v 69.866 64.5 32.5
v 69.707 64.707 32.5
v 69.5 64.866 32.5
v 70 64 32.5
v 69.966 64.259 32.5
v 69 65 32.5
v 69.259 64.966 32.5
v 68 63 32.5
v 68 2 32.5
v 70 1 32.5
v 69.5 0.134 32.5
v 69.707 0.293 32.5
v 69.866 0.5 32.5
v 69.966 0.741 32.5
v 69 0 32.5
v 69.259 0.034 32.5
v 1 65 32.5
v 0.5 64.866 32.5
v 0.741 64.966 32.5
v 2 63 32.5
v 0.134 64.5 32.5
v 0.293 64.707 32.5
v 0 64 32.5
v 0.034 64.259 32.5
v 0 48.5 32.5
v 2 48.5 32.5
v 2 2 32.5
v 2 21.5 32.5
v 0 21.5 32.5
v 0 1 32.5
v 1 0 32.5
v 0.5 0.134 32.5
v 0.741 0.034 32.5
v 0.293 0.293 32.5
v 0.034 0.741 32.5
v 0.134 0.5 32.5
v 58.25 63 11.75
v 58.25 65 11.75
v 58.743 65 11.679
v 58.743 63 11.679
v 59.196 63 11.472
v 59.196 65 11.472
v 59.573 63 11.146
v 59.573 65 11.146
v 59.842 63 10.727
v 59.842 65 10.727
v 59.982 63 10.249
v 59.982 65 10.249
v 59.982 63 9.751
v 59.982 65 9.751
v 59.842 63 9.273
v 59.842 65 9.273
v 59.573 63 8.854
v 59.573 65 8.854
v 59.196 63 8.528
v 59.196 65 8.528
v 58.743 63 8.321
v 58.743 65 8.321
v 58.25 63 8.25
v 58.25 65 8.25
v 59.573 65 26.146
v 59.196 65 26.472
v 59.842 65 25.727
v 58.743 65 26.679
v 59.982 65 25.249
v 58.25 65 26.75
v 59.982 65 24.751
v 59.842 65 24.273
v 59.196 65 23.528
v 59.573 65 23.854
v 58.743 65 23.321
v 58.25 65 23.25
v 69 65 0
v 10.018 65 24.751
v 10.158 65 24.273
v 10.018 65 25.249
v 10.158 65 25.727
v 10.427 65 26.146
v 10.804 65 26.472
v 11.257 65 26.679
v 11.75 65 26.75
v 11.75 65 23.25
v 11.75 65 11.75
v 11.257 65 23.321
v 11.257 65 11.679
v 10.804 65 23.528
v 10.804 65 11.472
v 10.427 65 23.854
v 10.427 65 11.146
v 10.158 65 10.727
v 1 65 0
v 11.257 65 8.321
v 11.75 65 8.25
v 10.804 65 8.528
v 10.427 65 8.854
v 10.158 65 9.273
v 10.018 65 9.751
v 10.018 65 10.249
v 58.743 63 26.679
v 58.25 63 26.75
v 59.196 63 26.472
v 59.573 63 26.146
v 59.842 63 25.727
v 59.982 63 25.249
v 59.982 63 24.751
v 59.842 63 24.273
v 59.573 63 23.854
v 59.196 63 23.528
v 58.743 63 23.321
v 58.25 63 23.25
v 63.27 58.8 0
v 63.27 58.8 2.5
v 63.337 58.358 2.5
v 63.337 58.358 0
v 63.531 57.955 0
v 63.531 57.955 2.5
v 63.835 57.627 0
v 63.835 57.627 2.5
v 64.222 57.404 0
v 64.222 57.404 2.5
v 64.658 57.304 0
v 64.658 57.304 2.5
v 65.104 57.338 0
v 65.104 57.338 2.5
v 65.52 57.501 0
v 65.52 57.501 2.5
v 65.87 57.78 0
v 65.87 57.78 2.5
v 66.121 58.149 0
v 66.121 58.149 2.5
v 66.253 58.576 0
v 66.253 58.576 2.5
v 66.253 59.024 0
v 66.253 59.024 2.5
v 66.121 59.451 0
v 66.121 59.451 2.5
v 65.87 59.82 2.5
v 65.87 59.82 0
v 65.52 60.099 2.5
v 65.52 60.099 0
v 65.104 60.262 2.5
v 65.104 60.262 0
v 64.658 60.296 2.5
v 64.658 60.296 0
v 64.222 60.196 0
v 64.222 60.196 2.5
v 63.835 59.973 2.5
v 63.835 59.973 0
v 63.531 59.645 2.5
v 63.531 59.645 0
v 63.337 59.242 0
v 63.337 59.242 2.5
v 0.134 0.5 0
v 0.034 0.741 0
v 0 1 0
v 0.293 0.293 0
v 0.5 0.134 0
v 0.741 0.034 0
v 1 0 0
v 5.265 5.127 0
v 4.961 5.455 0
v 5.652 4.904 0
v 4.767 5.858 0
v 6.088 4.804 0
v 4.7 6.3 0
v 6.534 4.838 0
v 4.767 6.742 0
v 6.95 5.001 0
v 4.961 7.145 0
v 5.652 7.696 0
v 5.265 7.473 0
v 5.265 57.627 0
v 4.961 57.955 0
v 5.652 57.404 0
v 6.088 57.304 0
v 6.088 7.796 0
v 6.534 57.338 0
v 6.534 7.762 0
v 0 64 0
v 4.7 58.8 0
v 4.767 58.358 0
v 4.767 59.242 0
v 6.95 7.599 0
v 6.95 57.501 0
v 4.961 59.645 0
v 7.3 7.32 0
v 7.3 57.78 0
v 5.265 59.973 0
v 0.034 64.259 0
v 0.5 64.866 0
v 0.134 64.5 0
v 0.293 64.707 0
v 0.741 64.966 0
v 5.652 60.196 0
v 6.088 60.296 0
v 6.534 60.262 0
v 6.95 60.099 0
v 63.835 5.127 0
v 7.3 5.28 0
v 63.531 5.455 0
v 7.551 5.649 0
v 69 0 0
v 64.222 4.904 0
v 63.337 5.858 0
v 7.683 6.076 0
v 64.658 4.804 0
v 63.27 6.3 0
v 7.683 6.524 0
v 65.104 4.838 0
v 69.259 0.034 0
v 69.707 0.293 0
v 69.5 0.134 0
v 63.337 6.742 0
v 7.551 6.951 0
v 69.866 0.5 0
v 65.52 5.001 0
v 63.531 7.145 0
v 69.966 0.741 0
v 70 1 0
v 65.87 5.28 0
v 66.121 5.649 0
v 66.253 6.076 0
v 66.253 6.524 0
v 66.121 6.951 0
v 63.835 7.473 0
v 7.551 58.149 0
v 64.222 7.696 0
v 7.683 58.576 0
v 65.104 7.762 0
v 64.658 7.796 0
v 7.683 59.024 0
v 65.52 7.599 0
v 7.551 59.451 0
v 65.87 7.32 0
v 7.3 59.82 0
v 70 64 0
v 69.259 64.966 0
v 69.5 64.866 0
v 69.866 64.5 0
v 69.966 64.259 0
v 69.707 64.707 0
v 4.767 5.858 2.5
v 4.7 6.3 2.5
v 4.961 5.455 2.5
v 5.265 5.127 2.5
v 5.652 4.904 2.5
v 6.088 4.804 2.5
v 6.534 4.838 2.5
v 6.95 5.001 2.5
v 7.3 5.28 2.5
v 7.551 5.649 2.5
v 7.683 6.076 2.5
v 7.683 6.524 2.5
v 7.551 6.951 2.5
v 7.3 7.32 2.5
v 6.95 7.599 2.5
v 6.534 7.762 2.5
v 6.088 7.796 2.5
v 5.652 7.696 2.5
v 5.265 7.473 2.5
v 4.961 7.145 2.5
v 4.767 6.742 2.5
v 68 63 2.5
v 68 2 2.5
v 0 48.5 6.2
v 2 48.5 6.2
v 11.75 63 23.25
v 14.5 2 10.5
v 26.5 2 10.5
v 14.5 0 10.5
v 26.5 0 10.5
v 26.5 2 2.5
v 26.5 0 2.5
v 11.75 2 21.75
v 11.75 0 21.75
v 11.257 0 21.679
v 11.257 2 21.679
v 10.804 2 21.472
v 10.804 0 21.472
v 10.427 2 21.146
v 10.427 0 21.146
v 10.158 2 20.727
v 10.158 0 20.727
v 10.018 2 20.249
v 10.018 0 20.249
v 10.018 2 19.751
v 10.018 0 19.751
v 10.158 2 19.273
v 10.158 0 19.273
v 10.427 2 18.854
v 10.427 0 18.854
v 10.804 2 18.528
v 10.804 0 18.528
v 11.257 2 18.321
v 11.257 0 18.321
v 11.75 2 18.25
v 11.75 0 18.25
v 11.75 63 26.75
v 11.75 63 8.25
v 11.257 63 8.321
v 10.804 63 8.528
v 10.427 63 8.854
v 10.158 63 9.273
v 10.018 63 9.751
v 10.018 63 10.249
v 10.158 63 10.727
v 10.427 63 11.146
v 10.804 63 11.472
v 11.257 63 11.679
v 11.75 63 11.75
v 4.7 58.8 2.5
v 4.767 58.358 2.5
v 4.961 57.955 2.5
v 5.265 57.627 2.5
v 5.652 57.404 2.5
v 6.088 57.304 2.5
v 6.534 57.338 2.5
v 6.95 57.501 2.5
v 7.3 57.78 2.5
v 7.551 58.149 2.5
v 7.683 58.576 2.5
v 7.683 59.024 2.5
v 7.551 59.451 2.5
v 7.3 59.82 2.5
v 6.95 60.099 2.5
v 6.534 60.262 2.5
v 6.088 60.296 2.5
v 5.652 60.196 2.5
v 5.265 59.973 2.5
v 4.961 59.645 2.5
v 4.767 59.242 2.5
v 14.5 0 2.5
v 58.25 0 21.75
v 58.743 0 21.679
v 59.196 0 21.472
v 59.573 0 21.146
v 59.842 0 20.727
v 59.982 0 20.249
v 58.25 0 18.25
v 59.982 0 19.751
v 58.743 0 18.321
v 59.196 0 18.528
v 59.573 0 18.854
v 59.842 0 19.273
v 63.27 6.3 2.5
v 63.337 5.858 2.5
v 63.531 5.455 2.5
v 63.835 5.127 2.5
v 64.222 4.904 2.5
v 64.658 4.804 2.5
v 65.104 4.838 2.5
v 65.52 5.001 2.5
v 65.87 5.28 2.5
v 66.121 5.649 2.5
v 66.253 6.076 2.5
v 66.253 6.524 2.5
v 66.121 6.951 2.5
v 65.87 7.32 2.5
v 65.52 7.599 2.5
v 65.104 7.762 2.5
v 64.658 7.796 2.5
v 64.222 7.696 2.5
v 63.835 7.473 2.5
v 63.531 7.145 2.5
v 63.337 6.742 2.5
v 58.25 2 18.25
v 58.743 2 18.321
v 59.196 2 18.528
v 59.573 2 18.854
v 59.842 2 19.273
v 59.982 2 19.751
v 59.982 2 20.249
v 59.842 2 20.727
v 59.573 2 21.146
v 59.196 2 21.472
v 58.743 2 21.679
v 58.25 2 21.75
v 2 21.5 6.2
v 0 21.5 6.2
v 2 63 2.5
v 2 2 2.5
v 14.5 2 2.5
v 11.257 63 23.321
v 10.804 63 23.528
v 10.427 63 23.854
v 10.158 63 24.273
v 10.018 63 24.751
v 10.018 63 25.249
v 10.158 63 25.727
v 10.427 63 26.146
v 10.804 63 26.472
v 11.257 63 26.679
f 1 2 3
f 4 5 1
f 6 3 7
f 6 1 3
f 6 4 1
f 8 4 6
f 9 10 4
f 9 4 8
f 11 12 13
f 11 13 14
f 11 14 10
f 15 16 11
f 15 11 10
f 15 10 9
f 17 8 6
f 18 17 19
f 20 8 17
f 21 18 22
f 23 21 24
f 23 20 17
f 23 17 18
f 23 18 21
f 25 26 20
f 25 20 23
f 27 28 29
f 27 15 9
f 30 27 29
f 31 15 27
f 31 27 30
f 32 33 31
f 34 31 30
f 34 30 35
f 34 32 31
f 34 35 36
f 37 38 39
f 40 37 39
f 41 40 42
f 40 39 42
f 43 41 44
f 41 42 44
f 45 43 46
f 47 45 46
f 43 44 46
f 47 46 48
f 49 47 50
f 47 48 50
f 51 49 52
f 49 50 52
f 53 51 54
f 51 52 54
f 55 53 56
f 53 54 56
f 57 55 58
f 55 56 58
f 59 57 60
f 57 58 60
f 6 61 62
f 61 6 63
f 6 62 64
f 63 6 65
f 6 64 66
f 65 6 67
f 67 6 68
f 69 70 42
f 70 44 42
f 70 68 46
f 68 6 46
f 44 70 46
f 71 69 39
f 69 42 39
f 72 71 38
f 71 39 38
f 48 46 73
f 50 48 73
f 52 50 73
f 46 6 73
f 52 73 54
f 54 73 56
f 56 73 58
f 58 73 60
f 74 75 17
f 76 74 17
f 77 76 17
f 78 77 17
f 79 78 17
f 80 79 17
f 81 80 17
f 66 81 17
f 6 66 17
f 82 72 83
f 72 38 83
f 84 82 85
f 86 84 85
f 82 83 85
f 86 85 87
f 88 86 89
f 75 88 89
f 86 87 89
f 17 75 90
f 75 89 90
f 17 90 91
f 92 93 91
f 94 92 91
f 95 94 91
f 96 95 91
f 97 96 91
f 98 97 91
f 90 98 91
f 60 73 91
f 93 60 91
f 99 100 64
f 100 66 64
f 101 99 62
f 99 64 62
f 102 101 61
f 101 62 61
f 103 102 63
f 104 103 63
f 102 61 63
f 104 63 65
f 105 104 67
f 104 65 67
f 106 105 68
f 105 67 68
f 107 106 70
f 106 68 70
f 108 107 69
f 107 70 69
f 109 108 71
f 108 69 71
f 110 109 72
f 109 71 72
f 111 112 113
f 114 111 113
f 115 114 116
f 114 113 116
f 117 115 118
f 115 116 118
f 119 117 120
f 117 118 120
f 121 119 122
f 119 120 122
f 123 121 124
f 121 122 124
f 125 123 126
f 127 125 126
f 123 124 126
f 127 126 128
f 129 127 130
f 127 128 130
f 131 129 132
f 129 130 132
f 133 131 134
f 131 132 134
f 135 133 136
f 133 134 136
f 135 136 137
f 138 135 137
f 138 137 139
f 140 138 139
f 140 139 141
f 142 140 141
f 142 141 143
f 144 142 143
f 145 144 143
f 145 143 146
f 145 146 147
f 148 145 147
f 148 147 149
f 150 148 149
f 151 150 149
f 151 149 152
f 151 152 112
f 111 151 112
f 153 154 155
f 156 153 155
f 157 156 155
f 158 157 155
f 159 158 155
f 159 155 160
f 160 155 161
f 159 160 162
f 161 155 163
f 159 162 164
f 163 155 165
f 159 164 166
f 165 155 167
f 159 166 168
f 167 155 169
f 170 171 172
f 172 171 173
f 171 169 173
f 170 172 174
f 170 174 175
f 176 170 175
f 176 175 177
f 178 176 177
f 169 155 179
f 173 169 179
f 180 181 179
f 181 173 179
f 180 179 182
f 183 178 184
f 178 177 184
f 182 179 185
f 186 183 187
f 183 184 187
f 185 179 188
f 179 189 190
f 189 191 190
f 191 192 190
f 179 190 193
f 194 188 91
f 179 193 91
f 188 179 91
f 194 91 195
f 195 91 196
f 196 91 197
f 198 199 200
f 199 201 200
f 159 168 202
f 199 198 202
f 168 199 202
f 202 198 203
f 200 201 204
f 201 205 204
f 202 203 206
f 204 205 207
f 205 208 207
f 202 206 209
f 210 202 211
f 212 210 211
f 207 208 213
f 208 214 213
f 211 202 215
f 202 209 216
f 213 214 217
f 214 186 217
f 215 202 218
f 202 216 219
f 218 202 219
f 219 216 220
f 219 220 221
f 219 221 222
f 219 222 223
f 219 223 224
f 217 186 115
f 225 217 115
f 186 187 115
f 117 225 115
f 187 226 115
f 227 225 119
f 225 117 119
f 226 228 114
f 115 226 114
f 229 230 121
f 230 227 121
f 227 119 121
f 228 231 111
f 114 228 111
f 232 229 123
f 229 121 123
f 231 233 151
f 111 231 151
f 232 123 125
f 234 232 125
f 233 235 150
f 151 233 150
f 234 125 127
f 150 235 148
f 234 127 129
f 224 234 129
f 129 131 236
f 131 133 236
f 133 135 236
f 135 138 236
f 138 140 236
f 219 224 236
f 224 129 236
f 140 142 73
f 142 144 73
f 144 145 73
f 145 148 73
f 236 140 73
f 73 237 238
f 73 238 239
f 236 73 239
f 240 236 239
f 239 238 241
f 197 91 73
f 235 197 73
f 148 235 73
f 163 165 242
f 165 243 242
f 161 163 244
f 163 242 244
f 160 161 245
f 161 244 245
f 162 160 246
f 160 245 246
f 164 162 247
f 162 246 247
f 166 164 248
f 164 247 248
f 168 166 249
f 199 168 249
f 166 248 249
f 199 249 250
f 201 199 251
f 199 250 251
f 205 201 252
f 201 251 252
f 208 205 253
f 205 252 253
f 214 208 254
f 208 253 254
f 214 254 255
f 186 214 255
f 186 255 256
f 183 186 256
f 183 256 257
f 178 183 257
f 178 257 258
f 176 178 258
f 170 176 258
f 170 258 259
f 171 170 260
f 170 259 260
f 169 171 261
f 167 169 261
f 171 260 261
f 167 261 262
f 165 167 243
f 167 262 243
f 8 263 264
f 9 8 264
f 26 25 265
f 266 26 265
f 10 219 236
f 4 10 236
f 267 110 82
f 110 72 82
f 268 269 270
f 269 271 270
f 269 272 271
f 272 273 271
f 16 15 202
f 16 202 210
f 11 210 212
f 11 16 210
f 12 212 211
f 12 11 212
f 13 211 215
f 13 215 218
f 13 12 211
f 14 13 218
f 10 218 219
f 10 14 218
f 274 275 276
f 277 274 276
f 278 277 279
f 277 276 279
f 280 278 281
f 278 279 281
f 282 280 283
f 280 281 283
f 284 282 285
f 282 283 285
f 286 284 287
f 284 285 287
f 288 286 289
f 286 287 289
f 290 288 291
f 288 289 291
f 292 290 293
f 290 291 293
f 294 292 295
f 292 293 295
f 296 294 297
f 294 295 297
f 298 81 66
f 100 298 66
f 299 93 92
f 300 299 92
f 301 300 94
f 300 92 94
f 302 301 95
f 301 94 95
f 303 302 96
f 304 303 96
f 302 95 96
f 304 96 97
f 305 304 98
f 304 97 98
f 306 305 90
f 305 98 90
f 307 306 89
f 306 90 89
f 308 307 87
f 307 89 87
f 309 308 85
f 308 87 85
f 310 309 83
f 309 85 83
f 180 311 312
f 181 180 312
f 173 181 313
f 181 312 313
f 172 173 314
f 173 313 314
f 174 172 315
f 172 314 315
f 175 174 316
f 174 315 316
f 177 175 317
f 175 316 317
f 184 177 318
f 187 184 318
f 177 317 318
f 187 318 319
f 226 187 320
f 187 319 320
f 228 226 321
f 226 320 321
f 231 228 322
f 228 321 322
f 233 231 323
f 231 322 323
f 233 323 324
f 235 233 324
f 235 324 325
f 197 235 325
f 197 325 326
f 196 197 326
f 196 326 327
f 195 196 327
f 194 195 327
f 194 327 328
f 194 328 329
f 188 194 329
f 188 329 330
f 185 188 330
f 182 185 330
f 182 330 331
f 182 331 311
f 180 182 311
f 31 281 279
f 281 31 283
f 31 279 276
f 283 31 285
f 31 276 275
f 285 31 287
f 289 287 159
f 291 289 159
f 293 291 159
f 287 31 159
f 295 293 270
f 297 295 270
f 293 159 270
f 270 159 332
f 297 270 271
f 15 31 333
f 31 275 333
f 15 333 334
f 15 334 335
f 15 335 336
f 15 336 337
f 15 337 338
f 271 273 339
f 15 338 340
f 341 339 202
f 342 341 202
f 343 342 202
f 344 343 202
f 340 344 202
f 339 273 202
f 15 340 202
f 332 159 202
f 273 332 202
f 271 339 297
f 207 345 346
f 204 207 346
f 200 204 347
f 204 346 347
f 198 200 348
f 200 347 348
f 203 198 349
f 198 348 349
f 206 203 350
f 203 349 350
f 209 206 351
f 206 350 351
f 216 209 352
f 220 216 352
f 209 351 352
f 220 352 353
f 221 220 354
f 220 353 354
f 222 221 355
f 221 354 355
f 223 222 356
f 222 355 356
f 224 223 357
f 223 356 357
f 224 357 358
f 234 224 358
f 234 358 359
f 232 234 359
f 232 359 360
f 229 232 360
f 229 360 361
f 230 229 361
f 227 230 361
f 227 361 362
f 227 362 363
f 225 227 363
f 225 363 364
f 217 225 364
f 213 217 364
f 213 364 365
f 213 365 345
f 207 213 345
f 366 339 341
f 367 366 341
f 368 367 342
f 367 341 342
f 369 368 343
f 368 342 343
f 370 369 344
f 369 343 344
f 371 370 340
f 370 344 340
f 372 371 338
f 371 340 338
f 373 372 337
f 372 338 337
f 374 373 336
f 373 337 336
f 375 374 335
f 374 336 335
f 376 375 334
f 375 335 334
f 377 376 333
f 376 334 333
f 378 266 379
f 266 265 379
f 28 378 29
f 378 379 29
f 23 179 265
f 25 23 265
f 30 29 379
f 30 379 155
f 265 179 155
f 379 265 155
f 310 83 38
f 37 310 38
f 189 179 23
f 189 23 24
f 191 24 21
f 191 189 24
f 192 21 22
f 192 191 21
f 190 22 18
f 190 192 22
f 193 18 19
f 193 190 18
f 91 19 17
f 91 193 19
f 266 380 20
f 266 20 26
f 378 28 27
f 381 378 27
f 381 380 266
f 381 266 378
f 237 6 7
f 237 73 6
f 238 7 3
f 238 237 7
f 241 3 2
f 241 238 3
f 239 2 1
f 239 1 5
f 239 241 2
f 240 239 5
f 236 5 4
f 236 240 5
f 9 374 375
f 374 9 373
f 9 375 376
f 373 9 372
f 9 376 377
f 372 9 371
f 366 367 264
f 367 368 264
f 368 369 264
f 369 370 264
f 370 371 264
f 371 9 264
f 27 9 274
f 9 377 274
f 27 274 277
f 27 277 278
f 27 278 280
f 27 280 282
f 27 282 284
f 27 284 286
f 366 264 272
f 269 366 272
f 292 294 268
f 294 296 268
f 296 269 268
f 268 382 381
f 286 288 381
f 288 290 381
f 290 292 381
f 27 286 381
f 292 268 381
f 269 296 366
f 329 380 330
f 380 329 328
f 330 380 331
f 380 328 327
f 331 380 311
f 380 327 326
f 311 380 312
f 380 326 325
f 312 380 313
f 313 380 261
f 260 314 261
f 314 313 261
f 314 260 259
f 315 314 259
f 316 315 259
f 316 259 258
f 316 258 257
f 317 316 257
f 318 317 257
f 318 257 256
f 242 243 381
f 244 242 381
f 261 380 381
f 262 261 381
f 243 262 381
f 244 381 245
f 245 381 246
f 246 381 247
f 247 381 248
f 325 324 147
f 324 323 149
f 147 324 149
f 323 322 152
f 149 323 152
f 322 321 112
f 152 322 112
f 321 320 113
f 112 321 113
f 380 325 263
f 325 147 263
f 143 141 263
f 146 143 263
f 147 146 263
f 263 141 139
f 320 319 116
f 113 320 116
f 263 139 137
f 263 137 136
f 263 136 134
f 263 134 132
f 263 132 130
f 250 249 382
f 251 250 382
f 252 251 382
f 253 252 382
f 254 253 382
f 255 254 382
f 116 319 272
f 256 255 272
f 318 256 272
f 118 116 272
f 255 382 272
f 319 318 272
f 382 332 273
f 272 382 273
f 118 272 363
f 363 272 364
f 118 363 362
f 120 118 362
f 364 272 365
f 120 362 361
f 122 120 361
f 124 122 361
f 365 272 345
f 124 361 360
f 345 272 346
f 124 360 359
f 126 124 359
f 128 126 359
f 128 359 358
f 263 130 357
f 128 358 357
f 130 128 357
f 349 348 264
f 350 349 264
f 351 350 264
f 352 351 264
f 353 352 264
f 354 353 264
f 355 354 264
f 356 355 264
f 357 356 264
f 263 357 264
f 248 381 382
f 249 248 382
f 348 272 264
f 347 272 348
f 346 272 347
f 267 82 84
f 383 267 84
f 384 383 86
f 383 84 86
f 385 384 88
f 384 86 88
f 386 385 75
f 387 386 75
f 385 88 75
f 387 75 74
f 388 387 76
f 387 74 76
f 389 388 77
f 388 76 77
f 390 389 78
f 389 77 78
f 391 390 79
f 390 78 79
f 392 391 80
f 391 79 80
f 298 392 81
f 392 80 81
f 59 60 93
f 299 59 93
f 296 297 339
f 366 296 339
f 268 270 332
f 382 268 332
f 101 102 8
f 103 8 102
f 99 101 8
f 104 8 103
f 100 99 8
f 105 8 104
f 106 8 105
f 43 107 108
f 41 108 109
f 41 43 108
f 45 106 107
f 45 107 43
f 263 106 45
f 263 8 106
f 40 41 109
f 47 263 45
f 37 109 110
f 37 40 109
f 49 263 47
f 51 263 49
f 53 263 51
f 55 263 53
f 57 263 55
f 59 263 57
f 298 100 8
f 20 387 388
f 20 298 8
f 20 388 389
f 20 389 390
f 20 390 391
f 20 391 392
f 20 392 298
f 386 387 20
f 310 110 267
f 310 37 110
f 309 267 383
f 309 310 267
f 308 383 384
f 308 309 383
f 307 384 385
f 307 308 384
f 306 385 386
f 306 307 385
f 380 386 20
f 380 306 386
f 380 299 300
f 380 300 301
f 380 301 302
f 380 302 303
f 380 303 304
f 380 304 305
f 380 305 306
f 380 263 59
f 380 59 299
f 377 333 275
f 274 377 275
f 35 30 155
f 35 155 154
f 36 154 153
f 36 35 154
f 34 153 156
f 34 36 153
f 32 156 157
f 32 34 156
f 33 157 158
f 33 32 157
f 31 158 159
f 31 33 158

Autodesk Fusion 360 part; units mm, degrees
sketch "Sketch1" plane through (0, 0, 0) normal (0, 0, 1) x (1, 0, 0)
  line L0 (0, 0) -> (70, 0)
  line L1 (70, 0) -> (70, 65)
  line L2 (70, 65) -> (0, 65)
  line L3 (0, 65) -> (0, 0)
  dimension "d1" = 70
  dimension "d2" = 65
extrude "Extrude1" add sketch "Sketch1" along normal blind 2.5
sketch "Sketch2" plane through (0, 0, 2.5) normal (0, 0, 1) x (-1, 0, 0)
  line L0 (0, -65) -> (0, 0)
  line L1 (0, 0) -> (-70, 0)
  line L2 (-70, 0) -> (-70, -65)
  line L3 (-70, -65) -> (0, -65)
  line L4 (0, -65) -> (-2, -65)
  line L5 (-2, -65) -> (-2, 0)
  line L6 (-2, 0) -> (0, 0)
  line L7 (0, 0) -> (0, -65)
  line L8 (-70, -65) -> (-68, -65)
  line L9 (-68, -65) -> (-68, 0)
  line L10 (-68, 0) -> (-70, 0)
  line L11 (-70, 0) -> (-70, -65)
  line L12 (0, -65) -> (-70, -65)
  line L13 (-70, -65) -> (-70, -63)
  line L14 (-70, -63) -> (0, -63)
  line L15 (0, -63) -> (0, -65)
  line L16 (0, 0) -> (-70, 0)
  line L17 (-70, 0) -> (-70, -2)
  line L18 (-70, -2) -> (0, -2)
  line L19 (0, -2) -> (0, 0)
  dimension "d5" = 2
  dimension "d6" = 2
  dimension "d7" = 65
  dimension "d8" = 2
  dimension "d9" = 2
extrude "Extrude2" add sketch "Sketch2" along normal blind 30 contours L0 L3 L4 L5 L7 L12 L14 L15 | L0 L5 L7 L14 L18 | L3 L5 L9 L12 L14 | L0 L1 L5 L6 L7 L16 L18 L19 | L2 L3 L8 L9 L11 L12 L13 L14 | L1 L5 L9 L16 L18 | L2 L9 L11 L14 L18 | L1 L2 L9 L10 L11 L16 L17 L18
sketch "Sketch3" plane through (0, 0, 2.5) normal (0, 0, 1) x (-1, 0, 0)
  line L0 (-2, -2) -> (-68, -2)
  line L1 (-68, -2) -> (-68, -63)
  line L2 (-68, -63) -> (-2, -63)
  line L3 (-2, -63) -> (-2, -2)
  circle A0 centre (-6.2, -6.3) radius 1.5
  circle A1 centre (-6.2, -58.8) radius 1.5
  circle A2 centre (-64.77, -58.8) radius 1.5
  circle A3 centre (-64.77, -6.3) radius 1.5
  dimension "d12" = 3
  dimension "d13" = 3
  dimension "d14" = 3
  dimension "d15" = 3
  dimension "d16" = 58.57
  dimension "d17" = 58.57
  dimension "d18" = 52.5
  dimension "d19" = 52.5
extrude "Extrude3" cut sketch "Sketch3" against normal blind 2.5 contours A0 | A1 | A2 | A3
sketch "Sketch6" plane through (0, 0, 0) normal (0, -1, 0) x (1, 0, 0)
  line L0 (0, 0) -> (70, 0)
  line L1 (70, 0) -> (70, 32.5)
  line L2 (70, 32.5) -> (0, 32.5)
  line L3 (0, 32.5) -> (0, 0)
  line L4 (14.5, 2.5) -> (26.5, 2.5)
  line L5 (26.5, 2.5) -> (26.5, 10.5)
  line L6 (26.5, 10.5) -> (14.5, 10.5)
  line L7 (14.5, 10.5) -> (14.5, 2.5)
  line L8 (11.75, 18.25) -> (58.25, 18.25)
  arc A0 (58.25, 18.25) -> (58.25, 21.75) centre (58.25, 20) ccw
  line L9 (58.25, 21.75) -> (11.75, 21.75)
  arc A1 (11.75, 21.75) -> (11.75, 18.25) centre (11.75, 20) ccw
  line L10 (10, 20) -> (60, 20) construction
  dimension "d32" = 12
  dimension "d33" = 8
  dimension "d34" = 2.5
  dimension "d35" = 14.5
  dimension "d36" = 3.5
sketch "Sketch7" plane through (0, 0, 0) normal (-1, 0, 0) x (0, -1, 0)
  line L0 (-65, 0) -> (0, 0)
  line L1 (0, 0) -> (0, 32.5)
  line L2 (0, 32.5) -> (-65, 32.5)
  line L3 (-65, 32.5) -> (-65, 0)
  line L4 (-48.5, 6.2) -> (-21.5, 6.2)
  line L5 (-21.5, 6.2) -> (-21.5, 32.5)
  line L6 (-21.5, 32.5) -> (-48.5, 32.5)
  line L7 (-48.5, 32.5) -> (-48.5, 6.2)
  dimension "d37" = 16.5
  dimension "d38" = 6.2
  dimension "d47" = 27
  dimension "d48" = 26.3
extrude "Extrude6" cut sketch "Sketch7" against normal blind 2 contours L2 L4 L5 L6 L7
extrude "Extrude7" cut sketch "Sketch6" against normal blind 2 contours L4 L5 L6 L7 | L8 A0 L9 A1
sketch "Sketch8" plane through (0, 65, 0) normal (0, 1, 0) x (-1, 0, 0)
  line L0 (-70, 0) -> (0, 0)
  line L1 (0, 0) -> (0, 32.5)
  line L2 (0, 32.5) -> (-70, 32.5)
  line L3 (-70, 32.5) -> (-70, 0)
  line L4 (-58.25, 23.25) -> (-11.75, 23.25)
  arc A0 (-11.75, 23.25) -> (-11.75, 26.75) centre (-11.75, 25) ccw
  line L5 (-11.75, 26.75) -> (-58.25, 26.75)
  arc A1 (-58.25, 26.75) -> (-58.25, 23.25) centre (-58.25, 25) ccw
  line L6 (-60, 25) -> (-10, 25) construction
  line L7 (-58.25, 8.25) -> (-11.75, 8.25)
  arc A2 (-11.75, 8.25) -> (-11.75, 11.75) centre (-11.75, 10) ccw
  line L8 (-11.75, 11.75) -> (-58.25, 11.75)
  arc A3 (-58.25, 11.75) -> (-58.25, 8.25) centre (-58.25, 10) ccw
  line L9 (-60, 10) -> (-10, 10) construction
  dimension "d43" = 3.5
  dimension "d44" = 3.5
extrude "Extrude8" cut sketch "Sketch8" against normal blind 2 contours L4 A0 L5 A1 | L7 A2 L8 A3
fillet "Fillet1" radius 1 4 edges at (70, 0, 16.25) (0, 0, 16.25) (70, 65, 16.25) (0, 65, 16.25)
